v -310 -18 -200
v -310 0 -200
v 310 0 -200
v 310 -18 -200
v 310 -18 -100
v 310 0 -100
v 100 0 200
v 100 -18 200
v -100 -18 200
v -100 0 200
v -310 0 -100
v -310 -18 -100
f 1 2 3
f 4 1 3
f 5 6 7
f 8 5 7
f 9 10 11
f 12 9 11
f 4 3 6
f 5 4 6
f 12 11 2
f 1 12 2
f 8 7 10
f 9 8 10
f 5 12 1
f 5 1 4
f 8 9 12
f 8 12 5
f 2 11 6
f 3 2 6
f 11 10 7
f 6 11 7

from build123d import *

# Parameters (mm, degrees)
F1_DEPTH = 18


with BuildPart() as f1:
    # F0 (on Front) → F1 (new body)
    with BuildSketch(Plane.XZ):
        Polygon((100, -100), (310, -100), (100, 200), align=None)
        Polygon((-310, -200), (-100, -200), (100, -200), (310, -200), (310, -100), (100, -100), (100, 200), (-100, 200), (-100, -100), (-310, -100), align=None)
        Polygon((-100, 200), (-310, -100), (-100, -100), align=None)
    extrude(amount=F1_DEPTH)


solid = f1.part
